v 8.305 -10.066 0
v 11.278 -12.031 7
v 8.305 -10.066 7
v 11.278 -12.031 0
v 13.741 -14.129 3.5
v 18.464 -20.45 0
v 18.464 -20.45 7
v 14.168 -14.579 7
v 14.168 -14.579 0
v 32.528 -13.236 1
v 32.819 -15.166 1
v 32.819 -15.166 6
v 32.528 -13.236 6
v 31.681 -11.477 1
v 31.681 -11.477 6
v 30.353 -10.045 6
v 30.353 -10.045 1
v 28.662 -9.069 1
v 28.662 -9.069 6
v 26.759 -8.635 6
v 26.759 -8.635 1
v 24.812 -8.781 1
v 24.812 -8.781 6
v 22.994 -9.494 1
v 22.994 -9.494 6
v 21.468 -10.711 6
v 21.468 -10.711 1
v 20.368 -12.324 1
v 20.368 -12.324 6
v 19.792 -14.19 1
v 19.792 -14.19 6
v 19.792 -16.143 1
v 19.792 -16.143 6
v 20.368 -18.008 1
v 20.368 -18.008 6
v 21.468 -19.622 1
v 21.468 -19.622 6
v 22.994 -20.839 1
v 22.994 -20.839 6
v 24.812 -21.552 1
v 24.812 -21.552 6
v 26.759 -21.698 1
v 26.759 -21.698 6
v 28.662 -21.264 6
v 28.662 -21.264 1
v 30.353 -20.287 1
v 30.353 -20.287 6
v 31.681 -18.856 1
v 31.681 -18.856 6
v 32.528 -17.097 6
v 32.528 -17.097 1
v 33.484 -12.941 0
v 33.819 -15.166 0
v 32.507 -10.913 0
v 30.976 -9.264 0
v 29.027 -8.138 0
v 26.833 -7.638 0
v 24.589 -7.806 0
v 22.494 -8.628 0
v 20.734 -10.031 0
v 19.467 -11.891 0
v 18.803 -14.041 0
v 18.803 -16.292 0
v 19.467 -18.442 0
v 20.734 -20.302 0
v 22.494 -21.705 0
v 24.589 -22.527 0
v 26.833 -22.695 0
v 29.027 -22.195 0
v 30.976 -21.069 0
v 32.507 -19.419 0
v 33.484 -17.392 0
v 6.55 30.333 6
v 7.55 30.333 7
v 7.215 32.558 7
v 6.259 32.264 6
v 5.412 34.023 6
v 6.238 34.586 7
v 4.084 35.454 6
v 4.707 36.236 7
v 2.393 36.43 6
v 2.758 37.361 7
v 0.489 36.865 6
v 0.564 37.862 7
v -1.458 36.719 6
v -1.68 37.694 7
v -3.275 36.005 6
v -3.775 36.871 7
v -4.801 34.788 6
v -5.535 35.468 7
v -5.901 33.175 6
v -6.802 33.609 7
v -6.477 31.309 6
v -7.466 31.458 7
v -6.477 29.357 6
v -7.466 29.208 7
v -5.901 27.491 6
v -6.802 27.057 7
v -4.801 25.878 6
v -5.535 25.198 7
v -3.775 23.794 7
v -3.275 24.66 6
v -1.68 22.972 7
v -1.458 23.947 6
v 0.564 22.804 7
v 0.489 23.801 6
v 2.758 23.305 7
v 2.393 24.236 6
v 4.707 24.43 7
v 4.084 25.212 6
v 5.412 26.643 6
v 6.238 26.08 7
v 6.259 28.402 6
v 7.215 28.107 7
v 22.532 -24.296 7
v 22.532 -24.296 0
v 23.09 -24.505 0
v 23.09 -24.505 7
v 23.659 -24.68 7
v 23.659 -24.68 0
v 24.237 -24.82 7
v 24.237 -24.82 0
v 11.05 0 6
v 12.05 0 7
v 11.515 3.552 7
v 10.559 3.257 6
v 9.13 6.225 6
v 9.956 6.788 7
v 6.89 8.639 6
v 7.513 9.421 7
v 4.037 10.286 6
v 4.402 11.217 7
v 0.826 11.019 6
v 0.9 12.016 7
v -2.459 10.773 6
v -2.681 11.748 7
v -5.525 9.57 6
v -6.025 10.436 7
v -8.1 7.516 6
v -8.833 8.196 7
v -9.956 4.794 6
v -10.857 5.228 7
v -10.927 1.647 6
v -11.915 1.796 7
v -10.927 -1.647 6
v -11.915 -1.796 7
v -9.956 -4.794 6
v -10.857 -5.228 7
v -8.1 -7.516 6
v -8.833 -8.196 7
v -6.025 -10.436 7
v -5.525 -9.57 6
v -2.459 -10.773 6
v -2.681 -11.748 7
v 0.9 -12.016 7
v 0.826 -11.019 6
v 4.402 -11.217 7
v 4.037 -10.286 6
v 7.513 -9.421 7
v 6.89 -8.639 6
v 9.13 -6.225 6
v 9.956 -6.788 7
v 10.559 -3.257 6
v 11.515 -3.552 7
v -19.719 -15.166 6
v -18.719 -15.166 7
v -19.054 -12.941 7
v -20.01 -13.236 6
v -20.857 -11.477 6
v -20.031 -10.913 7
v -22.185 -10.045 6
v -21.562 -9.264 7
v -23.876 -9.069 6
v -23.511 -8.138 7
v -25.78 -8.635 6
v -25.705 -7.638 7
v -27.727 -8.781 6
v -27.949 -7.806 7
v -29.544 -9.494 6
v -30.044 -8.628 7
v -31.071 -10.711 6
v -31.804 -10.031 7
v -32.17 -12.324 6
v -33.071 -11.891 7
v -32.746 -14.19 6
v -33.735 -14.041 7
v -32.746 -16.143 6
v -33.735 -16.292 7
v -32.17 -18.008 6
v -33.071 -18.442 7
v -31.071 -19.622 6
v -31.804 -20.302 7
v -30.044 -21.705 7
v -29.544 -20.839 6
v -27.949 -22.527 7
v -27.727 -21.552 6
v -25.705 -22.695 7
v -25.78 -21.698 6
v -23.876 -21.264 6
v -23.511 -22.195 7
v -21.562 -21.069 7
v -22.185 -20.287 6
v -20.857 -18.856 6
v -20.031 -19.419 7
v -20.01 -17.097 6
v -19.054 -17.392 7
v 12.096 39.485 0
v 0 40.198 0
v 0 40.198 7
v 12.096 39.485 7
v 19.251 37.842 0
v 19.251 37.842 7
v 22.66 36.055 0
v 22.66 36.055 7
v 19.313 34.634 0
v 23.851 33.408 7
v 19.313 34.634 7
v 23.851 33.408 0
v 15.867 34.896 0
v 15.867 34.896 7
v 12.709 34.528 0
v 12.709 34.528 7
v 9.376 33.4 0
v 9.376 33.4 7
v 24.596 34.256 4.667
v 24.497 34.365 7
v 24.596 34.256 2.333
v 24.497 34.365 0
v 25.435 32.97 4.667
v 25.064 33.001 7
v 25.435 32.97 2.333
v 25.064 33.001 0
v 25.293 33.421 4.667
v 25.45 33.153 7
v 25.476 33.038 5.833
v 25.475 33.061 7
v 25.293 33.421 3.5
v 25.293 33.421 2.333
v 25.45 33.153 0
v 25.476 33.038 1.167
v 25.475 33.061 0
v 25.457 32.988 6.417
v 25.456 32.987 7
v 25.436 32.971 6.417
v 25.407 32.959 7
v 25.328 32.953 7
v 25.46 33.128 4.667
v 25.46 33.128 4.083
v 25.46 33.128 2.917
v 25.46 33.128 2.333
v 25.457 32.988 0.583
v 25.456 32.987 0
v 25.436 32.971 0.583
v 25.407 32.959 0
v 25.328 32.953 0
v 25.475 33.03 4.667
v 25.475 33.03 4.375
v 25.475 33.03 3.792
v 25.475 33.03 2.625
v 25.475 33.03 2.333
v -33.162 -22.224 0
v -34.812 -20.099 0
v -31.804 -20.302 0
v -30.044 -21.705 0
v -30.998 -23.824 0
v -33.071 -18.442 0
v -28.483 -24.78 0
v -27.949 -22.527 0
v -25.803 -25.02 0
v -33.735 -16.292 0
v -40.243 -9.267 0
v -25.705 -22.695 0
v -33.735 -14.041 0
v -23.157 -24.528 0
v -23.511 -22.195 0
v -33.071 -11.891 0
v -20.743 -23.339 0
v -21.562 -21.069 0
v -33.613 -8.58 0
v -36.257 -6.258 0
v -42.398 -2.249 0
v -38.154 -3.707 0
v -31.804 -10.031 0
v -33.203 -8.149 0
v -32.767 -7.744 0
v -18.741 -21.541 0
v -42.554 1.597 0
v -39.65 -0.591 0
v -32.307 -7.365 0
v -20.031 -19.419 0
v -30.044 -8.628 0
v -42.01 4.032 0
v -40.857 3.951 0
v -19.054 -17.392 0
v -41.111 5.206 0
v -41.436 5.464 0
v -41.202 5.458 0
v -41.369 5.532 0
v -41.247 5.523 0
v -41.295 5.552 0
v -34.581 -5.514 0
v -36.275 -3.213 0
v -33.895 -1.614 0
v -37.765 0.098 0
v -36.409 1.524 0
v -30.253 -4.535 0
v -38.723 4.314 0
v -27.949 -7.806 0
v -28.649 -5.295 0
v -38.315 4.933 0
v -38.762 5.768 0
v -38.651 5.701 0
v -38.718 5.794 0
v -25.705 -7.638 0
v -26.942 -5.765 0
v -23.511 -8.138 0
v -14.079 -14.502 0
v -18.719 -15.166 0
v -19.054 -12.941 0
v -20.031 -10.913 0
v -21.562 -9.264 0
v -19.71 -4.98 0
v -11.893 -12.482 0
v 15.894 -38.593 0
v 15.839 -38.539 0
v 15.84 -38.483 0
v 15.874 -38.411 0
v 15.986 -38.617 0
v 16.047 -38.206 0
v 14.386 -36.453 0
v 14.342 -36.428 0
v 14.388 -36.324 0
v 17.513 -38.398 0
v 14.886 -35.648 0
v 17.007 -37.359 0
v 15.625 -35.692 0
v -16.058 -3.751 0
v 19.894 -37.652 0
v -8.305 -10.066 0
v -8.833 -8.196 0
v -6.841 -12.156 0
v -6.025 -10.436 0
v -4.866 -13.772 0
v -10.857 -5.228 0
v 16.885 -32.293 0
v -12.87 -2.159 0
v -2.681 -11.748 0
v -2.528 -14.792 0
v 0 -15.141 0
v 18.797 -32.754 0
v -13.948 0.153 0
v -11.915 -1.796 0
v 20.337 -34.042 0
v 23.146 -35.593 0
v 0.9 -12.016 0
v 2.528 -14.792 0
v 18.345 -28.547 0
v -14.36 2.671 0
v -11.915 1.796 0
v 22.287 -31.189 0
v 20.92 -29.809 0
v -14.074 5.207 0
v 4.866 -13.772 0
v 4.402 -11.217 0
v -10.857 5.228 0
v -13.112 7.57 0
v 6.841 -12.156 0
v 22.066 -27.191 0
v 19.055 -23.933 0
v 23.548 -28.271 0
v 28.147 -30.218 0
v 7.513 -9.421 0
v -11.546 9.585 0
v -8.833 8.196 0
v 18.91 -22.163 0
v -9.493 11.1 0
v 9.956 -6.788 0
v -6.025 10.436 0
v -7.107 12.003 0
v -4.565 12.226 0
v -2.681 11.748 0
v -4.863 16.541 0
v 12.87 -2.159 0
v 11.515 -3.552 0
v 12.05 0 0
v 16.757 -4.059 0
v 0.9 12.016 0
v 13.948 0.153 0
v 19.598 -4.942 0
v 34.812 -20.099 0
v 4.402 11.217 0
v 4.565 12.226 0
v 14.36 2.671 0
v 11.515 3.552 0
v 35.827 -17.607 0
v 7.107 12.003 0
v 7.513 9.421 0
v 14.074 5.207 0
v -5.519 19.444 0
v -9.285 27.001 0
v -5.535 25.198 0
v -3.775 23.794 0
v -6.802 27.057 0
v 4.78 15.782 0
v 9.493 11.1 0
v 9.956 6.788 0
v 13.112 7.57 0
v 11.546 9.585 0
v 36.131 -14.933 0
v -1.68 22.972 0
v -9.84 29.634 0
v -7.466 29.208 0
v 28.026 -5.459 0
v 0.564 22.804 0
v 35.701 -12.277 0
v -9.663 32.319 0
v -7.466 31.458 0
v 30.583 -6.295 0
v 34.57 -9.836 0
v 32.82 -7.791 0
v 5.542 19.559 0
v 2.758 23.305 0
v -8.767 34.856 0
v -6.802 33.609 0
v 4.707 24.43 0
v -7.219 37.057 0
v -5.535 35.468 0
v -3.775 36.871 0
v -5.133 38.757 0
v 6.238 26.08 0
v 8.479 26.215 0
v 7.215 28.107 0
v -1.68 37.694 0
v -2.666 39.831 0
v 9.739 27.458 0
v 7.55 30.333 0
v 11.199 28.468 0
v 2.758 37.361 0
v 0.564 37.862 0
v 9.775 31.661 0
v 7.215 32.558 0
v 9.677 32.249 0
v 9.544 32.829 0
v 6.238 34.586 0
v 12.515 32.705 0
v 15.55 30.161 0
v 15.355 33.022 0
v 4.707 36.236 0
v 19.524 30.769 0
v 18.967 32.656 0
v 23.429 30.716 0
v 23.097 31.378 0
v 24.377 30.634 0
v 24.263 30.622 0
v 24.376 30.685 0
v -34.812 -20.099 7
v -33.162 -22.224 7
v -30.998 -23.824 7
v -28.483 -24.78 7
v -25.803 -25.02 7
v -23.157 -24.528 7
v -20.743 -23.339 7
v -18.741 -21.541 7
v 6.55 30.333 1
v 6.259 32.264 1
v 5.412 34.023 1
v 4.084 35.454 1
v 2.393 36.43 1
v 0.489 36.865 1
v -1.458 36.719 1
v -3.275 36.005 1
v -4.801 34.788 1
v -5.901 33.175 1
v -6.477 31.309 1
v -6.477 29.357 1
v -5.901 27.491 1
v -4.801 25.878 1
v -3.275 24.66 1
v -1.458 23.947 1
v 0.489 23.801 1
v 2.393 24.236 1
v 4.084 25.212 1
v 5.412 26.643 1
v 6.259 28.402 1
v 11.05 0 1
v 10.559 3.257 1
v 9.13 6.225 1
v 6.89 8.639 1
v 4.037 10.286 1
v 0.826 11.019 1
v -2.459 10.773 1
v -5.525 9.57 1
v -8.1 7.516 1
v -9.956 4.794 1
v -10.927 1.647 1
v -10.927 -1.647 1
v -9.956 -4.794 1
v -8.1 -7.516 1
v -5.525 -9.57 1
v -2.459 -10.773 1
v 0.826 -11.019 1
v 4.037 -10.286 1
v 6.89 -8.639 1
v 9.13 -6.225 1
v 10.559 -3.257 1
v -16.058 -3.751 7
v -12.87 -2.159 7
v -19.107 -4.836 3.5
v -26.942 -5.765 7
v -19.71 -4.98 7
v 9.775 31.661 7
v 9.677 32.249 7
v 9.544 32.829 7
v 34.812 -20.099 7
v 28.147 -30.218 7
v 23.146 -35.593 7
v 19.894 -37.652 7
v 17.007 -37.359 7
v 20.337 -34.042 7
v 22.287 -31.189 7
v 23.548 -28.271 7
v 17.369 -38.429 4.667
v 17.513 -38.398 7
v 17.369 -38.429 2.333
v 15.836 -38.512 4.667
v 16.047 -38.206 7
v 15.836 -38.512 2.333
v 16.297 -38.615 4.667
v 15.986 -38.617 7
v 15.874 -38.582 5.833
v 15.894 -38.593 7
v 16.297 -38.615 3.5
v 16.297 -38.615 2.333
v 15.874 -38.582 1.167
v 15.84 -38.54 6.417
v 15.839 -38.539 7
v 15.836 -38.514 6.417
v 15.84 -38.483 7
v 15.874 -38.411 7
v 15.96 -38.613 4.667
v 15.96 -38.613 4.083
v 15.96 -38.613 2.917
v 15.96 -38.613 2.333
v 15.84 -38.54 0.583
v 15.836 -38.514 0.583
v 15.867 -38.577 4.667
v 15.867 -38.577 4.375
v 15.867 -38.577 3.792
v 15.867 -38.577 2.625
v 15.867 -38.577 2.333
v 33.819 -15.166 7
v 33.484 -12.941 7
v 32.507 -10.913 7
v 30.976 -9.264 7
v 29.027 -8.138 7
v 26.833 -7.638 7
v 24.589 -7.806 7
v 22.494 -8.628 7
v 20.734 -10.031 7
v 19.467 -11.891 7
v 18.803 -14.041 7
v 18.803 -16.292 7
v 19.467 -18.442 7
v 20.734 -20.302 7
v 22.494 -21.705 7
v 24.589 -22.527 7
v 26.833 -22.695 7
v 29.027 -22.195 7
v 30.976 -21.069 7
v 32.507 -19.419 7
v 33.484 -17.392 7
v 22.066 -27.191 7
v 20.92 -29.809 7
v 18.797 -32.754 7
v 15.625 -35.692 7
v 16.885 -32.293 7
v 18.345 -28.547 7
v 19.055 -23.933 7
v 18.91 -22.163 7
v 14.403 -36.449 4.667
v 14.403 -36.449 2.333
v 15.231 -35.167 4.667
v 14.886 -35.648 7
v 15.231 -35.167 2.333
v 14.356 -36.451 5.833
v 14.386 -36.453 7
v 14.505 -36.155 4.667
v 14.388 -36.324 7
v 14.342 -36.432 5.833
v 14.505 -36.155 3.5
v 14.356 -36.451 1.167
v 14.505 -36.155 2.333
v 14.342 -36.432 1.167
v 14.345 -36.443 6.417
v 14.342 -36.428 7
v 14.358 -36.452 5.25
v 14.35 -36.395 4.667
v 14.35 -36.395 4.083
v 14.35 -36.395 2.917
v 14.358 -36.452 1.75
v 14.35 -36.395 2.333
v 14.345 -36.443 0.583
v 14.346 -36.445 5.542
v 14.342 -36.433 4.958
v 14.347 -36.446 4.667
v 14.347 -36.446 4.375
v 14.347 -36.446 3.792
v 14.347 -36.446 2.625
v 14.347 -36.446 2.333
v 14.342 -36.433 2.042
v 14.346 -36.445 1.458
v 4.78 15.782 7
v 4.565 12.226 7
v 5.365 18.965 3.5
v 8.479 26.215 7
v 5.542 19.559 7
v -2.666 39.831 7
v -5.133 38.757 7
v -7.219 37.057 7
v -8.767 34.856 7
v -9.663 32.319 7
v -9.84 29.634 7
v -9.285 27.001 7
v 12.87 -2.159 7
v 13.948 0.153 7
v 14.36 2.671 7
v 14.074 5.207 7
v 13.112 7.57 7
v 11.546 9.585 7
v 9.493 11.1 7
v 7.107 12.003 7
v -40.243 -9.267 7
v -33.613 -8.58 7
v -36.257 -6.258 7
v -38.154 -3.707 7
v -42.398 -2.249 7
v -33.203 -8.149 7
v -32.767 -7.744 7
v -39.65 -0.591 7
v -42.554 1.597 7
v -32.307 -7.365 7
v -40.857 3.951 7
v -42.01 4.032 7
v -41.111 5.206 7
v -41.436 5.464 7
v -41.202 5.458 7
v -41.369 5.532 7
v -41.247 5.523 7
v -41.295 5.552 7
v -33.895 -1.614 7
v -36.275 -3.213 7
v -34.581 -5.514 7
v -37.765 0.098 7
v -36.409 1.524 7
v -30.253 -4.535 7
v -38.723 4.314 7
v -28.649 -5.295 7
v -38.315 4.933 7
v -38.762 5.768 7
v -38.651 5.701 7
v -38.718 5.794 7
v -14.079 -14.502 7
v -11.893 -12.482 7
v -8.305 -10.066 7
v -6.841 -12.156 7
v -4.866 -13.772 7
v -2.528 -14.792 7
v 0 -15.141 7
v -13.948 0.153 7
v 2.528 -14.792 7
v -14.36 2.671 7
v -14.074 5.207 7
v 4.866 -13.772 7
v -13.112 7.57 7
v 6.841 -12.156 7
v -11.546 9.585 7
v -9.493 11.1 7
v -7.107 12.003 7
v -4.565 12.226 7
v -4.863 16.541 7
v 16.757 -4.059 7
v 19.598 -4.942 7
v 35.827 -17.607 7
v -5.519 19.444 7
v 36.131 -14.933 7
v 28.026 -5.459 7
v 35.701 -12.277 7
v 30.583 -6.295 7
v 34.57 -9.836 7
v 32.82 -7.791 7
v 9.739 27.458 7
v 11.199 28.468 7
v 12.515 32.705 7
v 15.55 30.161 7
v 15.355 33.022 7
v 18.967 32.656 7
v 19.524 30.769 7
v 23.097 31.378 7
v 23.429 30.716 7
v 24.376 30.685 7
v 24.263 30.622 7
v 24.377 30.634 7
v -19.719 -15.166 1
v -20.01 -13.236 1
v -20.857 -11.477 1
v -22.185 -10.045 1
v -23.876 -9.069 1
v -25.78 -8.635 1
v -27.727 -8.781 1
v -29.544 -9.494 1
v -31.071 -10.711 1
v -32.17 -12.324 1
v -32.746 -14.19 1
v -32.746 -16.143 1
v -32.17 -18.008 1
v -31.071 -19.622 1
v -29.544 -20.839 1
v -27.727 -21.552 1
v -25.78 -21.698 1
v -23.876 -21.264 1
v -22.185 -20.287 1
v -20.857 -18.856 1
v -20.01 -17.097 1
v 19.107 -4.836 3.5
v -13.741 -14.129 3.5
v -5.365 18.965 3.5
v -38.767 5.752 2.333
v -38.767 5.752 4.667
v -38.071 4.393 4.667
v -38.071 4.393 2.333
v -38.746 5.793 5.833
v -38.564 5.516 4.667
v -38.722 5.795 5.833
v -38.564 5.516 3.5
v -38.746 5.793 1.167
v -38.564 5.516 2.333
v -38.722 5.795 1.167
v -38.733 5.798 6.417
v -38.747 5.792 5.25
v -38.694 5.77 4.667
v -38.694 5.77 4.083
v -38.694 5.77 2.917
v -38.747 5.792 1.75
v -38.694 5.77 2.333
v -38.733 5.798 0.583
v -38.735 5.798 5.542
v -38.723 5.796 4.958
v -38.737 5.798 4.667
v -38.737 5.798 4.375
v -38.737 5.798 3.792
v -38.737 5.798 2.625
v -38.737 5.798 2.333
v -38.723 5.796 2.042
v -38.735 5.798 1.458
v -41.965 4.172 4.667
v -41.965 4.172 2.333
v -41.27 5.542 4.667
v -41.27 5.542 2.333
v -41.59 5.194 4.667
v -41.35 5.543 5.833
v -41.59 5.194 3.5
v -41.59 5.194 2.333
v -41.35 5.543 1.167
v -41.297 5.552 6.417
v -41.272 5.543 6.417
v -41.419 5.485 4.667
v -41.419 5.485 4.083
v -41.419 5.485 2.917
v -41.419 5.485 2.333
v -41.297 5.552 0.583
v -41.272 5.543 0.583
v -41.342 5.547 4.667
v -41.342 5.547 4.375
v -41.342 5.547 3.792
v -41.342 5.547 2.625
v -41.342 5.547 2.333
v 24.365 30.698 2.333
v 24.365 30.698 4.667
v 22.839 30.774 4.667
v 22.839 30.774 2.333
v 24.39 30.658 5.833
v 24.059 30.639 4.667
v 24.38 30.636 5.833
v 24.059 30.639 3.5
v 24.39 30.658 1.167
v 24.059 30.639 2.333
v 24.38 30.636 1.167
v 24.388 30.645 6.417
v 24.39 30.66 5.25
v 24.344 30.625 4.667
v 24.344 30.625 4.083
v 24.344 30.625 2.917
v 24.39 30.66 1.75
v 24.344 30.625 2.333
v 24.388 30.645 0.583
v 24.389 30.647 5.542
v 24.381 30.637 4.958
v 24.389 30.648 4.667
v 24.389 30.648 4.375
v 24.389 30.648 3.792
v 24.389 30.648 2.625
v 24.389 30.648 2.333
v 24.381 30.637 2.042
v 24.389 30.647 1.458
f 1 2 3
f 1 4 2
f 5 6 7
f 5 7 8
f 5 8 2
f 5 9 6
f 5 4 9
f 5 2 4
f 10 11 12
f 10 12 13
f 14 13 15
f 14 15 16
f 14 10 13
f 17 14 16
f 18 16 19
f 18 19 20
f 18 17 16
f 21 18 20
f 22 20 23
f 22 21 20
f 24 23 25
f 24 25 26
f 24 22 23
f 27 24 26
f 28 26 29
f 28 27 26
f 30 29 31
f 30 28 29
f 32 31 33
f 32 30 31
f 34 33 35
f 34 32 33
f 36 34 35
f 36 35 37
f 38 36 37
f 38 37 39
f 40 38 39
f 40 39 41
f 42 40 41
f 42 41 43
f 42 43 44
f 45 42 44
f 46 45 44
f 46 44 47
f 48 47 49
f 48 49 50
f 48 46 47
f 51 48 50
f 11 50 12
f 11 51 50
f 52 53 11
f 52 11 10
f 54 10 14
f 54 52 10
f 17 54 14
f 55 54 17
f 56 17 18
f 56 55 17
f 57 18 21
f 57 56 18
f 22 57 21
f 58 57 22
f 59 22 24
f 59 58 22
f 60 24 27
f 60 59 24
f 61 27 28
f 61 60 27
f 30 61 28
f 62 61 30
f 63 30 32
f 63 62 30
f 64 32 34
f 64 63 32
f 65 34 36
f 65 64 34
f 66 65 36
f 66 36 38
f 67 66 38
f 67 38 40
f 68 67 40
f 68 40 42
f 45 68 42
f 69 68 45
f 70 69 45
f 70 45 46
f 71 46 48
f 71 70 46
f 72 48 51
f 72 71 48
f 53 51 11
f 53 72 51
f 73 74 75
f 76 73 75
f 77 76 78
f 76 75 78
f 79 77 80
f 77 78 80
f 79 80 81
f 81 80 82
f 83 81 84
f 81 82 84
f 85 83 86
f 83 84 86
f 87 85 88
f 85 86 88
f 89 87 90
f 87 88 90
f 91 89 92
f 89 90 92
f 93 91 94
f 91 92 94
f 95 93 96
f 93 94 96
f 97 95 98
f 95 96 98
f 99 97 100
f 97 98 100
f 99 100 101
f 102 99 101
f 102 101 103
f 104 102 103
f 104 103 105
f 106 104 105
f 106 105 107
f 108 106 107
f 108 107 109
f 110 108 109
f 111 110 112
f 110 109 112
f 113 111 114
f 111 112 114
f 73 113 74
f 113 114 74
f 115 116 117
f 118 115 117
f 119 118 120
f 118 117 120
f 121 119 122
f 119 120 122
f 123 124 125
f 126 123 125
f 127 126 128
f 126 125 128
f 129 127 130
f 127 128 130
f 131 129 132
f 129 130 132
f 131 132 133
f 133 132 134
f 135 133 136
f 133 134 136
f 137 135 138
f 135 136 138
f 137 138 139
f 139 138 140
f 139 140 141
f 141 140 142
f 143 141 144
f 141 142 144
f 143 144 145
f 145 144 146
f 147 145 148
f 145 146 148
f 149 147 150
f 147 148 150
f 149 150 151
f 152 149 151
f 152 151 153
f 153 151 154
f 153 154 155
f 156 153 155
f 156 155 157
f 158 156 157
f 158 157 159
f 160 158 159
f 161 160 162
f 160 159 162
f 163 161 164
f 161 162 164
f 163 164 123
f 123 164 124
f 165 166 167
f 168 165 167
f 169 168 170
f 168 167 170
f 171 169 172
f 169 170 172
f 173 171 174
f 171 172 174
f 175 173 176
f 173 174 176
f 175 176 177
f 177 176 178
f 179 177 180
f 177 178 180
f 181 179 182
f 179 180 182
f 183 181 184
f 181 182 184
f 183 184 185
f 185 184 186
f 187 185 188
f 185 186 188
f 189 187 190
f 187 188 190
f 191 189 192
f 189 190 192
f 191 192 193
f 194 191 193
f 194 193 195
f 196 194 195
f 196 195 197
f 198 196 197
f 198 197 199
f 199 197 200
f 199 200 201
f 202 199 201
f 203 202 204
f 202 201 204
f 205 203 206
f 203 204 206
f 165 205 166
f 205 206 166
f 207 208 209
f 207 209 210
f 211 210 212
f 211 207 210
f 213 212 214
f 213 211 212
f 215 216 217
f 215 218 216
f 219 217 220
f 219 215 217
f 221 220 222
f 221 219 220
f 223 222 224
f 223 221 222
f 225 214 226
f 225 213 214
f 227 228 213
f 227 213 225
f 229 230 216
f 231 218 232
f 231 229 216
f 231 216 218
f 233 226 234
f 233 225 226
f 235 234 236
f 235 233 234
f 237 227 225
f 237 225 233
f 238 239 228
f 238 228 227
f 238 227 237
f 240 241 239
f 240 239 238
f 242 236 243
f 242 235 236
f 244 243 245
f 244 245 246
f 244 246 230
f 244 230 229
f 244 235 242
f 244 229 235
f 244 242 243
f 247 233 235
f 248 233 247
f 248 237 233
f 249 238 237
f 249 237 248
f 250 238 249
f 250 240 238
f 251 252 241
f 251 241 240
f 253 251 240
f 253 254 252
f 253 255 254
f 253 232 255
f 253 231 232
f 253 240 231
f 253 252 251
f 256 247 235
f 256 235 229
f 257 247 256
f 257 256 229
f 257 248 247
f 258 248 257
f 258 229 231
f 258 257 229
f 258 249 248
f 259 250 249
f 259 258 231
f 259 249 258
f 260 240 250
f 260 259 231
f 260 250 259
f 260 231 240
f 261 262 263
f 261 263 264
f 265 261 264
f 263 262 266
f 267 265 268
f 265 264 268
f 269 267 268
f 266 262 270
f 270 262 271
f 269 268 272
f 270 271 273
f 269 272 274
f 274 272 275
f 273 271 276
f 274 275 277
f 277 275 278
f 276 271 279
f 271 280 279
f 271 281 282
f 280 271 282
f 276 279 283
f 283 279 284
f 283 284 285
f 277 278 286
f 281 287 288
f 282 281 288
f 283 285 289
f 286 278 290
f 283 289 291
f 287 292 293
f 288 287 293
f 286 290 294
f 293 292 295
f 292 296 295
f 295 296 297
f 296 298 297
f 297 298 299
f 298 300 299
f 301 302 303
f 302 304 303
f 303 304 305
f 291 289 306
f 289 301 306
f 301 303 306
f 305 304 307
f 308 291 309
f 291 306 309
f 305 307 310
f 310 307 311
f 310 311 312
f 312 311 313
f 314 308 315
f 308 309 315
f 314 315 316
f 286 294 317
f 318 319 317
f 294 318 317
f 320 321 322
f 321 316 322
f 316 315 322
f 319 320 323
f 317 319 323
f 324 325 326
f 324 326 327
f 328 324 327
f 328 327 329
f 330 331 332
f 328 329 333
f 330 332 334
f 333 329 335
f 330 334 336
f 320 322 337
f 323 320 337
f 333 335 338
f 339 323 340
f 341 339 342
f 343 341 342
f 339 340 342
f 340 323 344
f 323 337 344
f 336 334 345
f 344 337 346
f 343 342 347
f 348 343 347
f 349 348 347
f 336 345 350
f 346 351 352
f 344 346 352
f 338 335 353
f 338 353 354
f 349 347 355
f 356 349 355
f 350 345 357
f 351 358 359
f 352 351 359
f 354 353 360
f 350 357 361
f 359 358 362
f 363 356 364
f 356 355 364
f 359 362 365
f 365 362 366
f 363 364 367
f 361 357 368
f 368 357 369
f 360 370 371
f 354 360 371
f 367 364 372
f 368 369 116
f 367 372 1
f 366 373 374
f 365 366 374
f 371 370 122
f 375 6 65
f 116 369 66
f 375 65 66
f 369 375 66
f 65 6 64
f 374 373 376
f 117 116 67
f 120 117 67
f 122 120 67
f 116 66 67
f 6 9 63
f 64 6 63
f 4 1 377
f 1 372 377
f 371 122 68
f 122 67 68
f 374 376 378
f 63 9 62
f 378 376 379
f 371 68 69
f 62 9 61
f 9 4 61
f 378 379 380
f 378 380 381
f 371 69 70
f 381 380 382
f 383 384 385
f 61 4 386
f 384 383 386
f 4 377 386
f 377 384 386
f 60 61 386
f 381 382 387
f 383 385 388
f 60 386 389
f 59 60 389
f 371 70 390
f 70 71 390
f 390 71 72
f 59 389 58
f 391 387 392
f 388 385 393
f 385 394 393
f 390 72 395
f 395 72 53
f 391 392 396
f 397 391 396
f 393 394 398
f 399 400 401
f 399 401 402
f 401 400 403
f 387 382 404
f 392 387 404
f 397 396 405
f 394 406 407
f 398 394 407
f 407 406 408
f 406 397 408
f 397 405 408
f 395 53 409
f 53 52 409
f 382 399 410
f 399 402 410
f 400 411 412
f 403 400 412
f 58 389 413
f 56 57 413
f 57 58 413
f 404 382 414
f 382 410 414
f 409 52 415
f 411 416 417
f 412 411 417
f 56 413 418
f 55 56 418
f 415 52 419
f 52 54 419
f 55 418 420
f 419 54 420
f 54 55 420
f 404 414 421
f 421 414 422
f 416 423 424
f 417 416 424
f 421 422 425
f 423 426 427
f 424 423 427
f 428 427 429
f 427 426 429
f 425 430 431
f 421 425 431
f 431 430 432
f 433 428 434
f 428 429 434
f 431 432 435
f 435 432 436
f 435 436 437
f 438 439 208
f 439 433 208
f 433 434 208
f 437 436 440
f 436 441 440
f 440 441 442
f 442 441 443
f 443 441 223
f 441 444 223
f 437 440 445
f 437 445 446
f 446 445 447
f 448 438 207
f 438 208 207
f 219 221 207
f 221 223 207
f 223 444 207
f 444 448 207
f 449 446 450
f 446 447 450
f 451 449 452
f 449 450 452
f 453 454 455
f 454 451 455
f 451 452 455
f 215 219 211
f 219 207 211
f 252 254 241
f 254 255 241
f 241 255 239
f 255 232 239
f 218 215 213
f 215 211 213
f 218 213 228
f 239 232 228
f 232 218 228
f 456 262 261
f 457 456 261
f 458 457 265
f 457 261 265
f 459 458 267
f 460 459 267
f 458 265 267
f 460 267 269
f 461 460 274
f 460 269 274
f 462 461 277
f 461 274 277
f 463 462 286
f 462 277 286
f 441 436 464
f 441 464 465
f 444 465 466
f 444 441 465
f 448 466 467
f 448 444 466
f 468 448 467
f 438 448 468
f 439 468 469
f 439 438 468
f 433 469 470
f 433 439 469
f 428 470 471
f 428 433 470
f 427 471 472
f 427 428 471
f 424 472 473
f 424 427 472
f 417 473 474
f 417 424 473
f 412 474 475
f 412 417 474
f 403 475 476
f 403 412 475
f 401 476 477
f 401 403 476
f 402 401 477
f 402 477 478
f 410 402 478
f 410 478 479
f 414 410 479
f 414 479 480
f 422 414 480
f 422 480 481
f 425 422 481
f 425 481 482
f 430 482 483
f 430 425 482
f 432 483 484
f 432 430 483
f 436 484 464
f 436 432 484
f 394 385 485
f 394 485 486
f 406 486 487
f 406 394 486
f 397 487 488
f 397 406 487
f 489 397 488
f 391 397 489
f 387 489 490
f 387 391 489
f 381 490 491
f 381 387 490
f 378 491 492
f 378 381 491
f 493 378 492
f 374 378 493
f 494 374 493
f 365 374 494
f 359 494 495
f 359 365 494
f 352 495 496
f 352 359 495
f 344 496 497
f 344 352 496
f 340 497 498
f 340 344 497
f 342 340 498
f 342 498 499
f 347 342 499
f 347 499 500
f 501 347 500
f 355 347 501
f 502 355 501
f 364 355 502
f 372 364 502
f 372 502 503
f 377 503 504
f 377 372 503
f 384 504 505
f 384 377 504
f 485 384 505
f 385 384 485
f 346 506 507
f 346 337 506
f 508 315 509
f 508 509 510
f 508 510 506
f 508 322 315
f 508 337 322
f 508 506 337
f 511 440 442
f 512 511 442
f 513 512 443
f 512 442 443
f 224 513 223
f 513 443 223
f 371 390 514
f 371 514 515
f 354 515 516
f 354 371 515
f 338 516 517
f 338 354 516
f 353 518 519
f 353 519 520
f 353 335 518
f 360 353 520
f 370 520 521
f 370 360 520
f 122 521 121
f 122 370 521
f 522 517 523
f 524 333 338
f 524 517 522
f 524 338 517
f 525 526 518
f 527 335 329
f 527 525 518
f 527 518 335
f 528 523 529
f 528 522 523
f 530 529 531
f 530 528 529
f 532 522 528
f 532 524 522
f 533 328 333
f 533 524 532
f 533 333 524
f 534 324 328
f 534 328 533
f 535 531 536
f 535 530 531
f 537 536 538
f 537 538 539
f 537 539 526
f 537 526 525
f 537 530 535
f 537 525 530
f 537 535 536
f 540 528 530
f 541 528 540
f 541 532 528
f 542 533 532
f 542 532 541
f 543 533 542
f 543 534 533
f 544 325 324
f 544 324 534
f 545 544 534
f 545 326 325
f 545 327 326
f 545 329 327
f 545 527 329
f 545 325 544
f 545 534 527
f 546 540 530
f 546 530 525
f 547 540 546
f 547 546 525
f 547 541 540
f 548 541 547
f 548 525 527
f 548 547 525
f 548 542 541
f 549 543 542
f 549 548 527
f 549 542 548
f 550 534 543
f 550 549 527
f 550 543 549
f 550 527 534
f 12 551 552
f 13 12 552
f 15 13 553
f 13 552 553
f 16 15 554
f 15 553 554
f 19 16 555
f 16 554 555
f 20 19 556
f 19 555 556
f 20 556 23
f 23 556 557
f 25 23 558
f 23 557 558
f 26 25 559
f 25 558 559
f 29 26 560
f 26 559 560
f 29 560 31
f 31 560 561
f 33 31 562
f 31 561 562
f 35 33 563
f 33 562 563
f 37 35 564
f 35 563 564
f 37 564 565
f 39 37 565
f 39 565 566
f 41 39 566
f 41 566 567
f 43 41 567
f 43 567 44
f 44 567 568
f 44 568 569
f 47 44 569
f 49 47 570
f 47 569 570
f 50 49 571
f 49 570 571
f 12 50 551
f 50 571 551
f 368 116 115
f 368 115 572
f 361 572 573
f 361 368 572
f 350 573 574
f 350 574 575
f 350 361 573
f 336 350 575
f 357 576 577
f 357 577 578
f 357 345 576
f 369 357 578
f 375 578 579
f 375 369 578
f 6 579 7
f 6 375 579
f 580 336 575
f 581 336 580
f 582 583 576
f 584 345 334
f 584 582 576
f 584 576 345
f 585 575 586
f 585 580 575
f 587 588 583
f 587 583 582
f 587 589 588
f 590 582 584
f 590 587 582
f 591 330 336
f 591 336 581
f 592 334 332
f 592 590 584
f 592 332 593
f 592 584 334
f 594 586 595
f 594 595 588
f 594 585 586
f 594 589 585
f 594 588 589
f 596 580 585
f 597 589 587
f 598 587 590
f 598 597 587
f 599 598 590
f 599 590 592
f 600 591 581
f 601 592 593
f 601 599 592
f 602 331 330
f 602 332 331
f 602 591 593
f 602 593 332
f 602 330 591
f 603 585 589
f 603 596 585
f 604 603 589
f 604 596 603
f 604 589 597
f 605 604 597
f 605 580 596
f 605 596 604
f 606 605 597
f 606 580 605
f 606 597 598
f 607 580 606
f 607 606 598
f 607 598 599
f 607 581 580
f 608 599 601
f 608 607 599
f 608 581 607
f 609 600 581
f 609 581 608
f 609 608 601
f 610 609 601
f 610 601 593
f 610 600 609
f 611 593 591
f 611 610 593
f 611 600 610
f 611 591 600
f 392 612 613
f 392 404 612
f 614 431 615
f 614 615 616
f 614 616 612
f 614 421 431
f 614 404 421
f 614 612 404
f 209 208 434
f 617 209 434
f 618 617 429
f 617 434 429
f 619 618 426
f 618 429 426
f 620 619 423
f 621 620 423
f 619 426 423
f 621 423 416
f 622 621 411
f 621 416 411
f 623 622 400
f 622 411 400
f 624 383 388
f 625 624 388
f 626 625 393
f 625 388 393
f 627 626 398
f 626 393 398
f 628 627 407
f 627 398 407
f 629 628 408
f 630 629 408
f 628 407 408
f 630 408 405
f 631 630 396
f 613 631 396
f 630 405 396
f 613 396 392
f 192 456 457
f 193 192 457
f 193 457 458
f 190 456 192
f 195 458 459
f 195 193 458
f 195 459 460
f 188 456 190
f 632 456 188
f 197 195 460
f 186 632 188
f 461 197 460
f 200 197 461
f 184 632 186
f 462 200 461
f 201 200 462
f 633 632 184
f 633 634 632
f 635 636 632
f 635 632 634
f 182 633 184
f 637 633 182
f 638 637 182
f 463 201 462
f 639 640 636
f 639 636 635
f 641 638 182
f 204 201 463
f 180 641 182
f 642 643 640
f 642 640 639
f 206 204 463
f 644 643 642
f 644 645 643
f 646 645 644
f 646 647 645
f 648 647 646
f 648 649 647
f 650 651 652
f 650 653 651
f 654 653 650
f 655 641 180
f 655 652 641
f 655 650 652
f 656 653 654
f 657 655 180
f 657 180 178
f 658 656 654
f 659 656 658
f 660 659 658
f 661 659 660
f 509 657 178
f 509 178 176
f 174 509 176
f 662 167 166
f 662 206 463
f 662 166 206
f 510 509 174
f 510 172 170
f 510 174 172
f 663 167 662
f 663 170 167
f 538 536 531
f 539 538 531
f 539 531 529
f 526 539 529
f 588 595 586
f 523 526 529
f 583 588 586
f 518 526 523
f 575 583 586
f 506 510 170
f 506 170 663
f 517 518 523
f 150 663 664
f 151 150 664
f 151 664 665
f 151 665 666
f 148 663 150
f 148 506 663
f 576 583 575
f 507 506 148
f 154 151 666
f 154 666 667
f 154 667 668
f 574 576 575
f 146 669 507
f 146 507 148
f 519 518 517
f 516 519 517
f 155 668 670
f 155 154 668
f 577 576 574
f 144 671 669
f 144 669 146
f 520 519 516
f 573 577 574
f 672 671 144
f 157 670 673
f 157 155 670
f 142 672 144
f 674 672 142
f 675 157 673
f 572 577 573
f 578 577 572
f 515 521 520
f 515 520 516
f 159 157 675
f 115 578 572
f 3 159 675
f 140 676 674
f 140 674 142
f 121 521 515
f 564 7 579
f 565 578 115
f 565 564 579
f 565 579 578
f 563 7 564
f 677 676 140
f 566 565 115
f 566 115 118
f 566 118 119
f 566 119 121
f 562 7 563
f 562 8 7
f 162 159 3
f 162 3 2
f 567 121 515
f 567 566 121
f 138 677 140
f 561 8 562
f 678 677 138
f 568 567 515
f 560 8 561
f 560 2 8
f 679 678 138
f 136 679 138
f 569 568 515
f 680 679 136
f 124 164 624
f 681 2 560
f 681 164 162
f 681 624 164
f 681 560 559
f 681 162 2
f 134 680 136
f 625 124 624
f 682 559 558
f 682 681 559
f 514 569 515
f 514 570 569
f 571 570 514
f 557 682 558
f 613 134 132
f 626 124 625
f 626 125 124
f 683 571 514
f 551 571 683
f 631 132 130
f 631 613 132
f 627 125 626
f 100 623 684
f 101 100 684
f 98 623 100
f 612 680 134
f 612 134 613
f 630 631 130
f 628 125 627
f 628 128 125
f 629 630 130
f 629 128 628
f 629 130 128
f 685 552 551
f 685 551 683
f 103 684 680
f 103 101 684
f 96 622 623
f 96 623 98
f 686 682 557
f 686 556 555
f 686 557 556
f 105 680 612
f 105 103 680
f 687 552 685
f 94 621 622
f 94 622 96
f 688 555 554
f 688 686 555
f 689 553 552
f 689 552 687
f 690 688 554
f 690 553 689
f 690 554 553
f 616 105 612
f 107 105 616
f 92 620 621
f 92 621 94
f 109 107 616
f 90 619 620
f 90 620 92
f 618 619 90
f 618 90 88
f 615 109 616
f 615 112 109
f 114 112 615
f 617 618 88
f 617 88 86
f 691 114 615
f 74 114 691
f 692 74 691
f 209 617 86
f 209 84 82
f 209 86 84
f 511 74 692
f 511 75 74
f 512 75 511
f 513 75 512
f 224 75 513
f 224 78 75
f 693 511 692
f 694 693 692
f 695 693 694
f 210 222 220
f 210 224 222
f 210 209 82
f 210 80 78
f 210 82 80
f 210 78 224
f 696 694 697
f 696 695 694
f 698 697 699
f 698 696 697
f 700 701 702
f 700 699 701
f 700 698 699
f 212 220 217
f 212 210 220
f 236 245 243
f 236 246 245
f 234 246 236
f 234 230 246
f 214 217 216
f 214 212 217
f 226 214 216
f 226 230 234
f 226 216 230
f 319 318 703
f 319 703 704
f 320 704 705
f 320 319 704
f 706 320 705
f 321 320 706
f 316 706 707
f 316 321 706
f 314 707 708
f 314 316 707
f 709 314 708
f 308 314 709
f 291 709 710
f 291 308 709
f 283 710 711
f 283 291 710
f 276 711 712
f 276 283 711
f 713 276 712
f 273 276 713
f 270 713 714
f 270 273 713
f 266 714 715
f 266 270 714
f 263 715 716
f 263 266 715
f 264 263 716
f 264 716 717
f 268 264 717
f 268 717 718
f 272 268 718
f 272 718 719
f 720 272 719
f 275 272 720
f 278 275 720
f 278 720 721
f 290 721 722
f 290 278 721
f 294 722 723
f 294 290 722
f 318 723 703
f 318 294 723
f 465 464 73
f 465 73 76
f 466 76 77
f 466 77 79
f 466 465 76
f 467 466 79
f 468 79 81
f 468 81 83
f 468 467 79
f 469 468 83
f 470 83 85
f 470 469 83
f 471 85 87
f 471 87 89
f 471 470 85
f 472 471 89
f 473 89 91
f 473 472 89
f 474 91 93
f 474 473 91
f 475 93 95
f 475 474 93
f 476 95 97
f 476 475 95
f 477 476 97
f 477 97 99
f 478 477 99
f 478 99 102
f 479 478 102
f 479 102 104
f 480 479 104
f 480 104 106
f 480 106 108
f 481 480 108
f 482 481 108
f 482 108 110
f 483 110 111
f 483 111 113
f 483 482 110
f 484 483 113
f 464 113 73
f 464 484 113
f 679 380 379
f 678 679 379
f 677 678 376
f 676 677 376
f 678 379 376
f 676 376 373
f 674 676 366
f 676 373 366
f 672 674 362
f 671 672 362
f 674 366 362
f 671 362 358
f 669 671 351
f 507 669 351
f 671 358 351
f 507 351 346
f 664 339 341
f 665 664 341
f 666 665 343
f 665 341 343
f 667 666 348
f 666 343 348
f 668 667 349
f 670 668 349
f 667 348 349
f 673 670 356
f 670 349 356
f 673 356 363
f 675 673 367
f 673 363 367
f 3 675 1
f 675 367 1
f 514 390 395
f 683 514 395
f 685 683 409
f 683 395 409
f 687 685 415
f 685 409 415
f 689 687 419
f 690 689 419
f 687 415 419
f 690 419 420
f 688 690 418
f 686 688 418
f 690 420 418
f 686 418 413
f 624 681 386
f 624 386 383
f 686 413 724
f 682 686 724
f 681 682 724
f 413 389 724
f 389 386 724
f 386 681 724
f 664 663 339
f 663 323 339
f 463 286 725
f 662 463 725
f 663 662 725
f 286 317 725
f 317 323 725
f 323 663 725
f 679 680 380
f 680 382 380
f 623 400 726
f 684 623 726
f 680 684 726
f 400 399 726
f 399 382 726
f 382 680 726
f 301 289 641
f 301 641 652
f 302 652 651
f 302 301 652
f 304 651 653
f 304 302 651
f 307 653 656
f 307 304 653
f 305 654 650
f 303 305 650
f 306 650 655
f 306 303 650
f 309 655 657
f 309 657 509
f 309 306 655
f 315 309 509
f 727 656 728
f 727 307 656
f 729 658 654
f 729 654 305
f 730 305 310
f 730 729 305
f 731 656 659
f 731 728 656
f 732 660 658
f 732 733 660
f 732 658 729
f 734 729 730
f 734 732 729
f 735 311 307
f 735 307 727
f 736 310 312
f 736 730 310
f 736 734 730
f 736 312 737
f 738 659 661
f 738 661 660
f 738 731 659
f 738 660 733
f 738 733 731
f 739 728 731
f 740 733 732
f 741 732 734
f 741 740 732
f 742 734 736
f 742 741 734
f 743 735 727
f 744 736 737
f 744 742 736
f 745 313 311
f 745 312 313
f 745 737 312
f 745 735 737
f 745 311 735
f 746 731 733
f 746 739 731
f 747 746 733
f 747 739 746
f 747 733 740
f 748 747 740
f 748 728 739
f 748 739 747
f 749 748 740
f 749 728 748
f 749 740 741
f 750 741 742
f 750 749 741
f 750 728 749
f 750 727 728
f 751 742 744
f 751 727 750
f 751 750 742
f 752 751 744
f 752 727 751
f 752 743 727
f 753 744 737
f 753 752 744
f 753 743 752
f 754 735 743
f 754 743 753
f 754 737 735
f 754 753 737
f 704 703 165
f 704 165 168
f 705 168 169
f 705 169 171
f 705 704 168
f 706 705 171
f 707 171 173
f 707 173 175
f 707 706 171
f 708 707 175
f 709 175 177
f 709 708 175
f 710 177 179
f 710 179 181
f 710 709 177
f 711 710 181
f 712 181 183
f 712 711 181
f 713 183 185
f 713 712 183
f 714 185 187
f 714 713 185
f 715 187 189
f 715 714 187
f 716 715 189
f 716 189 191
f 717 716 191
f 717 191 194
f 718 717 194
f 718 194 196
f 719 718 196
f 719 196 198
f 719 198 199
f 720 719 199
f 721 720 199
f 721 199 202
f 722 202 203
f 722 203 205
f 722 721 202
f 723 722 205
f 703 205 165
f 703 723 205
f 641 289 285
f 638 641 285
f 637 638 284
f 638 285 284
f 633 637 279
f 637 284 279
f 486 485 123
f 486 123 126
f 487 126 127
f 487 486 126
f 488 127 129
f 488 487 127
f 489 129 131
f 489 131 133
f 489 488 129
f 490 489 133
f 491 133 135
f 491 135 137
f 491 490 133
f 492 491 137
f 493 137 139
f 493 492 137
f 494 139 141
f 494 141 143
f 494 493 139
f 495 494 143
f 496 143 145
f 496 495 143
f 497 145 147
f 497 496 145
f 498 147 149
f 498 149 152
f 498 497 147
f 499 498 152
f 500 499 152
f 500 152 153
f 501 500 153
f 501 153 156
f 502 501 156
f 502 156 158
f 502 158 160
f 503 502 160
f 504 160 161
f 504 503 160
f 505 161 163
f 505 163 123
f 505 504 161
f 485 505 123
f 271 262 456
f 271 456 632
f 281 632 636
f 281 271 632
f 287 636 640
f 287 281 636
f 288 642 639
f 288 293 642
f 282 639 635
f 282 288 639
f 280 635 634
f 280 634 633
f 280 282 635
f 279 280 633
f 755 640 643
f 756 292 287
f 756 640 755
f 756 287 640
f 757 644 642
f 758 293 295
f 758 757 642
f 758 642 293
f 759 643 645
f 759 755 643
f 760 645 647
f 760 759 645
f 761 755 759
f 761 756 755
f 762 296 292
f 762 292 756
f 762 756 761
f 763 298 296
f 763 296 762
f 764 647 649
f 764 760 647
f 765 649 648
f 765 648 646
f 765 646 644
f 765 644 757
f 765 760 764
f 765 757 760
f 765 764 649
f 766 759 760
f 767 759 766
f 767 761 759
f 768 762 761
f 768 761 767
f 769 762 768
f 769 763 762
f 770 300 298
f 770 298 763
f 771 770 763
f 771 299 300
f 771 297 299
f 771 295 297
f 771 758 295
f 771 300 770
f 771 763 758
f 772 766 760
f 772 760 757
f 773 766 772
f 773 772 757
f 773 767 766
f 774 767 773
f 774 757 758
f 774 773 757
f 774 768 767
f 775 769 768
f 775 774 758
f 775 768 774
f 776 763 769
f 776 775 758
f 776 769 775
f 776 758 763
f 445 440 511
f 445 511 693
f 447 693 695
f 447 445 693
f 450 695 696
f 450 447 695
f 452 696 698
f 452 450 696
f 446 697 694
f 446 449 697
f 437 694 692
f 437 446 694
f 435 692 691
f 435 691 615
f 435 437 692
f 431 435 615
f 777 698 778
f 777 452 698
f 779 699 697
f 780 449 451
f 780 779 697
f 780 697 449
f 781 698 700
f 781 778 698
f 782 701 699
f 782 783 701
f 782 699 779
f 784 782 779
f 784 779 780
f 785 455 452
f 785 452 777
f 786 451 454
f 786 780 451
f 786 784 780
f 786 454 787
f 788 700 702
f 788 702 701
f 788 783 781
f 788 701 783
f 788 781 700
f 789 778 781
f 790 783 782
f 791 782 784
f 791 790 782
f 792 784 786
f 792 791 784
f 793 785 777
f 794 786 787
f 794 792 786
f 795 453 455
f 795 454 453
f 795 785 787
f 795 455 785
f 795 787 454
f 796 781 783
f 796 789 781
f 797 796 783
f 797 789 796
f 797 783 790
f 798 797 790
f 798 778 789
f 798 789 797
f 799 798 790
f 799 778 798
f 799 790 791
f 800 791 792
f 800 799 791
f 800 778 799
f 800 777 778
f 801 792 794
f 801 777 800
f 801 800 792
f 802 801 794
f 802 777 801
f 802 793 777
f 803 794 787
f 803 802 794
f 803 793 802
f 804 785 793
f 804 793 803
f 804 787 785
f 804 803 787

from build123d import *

# Parameters (mm, degrees)
F0_R     = 6.55
F0_R_2   = 11.05
F1_DEPTH = 7
F2_SIZE  = 1


# Not quite as in the source:
# - ends of sketch curves that miss each other by under 0.0002 mm in the source are joined


with BuildPart() as f1:
    # F0 (on Top) → F1 (new body)
    with BuildSketch(Plane.XY):
        with BuildLine():
            ThreePointArc((0, 40.1977714043), (-8.0681283552, 36.0092836242), (-9.2850536357, 27.0005535305))
            add(Edge.make_bspline(
                [(-9.2850536357, 27.0005535305), (-7.6485537074, 23.76762968), (-4.7701185707, 19.4412735204), (-4.6697456794, 14.4884170356), (-4.5648748072, 12.2255101831)],
                knots=[0, 0, 0, 0, 0.5344080552, 1, 1, 1, 1], degree=3))
            ThreePointArc((-4.5648748072, 12.2255101831), (-13.112130235, 7.5702762234), (-12.8700869391, -2.1594819242))
            add(Edge.make_bspline(
                [(-26.9423555096, -5.7646466266), (-24.1168902387, -5.6160652927), (-18.509620442, -5.2218898403), (-14.7902779868, -3.1525456922), (-12.8700869391, -2.1594819242)],
                knots=[0.1344901828, 0.1344901828, 0.1344901828, 0.1344901828, 0.5556800273, 1, 1, 1, 1], degree=3))
            add(Edge.make_bspline(
                [(-32.3070856345, -7.3652547262), (-38.1561546686, -3.8908306821), (-39.2425077068, 7.9341737596), (-37.973119311, 3.3638390897), (-32.4811016658, -4.8031550223), (-26.9423555096, -5.7646466266)],
                knots=[0, 0, 0, 0, 0.4276612867, 0.5658731858, 1, 1, 1, 1], degree=3))
            ThreePointArc((-32.3070856345, -7.3652547262), (-32.9876607035, -7.9431032983), (-33.6132053721, -8.5801160647))
            add(Edge.make_bspline(
                [(-34.8122912116, -20.0988857021), (-44.0385765115, -3.9019687515), (-42.749663868, 2.1665983757), (-40.6223387742, 7.8779194346), (-40.8804383129, -3.4972060171), (-33.6132053721, -8.5801160647)],
                knots=[0, 0, 0, 0, 0.4894381035, 0.610016492, 1, 1, 1, 1], degree=3))
            ThreePointArc((-34.8122912116, -20.0988857021), (-27.150890213, -24.9918459287), (-18.7406384558, -21.5413690893))
            add(Edge.make_bspline(
                [(-18.7406384558, -21.5413690893), (-16.7590942369, -18.5076566528), (-14.4515774653, -13.8516806215), (-10.2124643737, -11.2883269054), (-8.3051649892, -10.0660526397)],
                knots=[0, 0, 0, 0, 0.5344080552, 1, 1, 1, 1], degree=3))
            ThreePointArc((-8.3051649892, -10.0660526397), (1.35944e-05, -15.1405759929), (8.3052096749, -10.0660812761))
            add(Edge.make_bspline(
                [(18.4635081773, -20.4504409958), (16.9221003321, -18.0778069606), (13.7770994784, -13.4188565971), (10.1253236494, -11.2324836195), (8.3052096749, -10.0660812761)],
                knots=[0.1344901828, 0.1344901828, 0.1344901828, 0.1344901828, 0.5556800273, 1, 1, 1, 1], degree=3))
            add(Edge.make_bspline(
                [(22.5320405154, -24.2961295186), (22.4476355468, -31.0987839127), (12.7500578195, -37.9520954621), (16.0733895496, -34.5676055291), (20.4002051005, -25.7278816743), (18.4635081773, -20.4504409958)],
                knots=[0, 0, 0, 0, 0.4276612867, 0.5658731858, 1, 1, 1, 1], degree=3))
            ThreePointArc((22.5320405154, -24.2961295186), (23.3727595929, -24.5966005315), (24.2372011654, -24.8198317225))
            add(Edge.make_bspline(
                [(34.8122912116, -20.0988857021), (25.3984923193, -36.1875416297), (19.4985027008, -38.1055941008), (13.4886910278, -39.1189370569), (23.4688884096, -33.6548950882), (24.2372011654, -24.8198317225)],
                knots=[0, 0, 0, 0, 0.4894381035, 0.610016492, 1, 1, 1, 1], degree=3))
            ThreePointArc((34.8122912116, -20.0988857021), (35.2190185683, -11.0174376955), (28.0256920915, -5.4591844412))
            add(Edge.make_bspline(
                [(28.0256920915, -5.4591844412), (24.4076479443, -5.2599730272), (19.221696036, -5.5895928989), (14.8822100532, -3.2000901302), (12.8700397964, -2.1594575434)],
                knots=[0, 0, 0, 0, 0.5344080552, 1, 1, 1, 1], degree=3))
            ThreePointArc((12.8700397964, -2.1594575434), (13.1121166406, 7.5702997695), (4.5648772642, 12.2255632002))
            add(Edge.make_bspline(
                [(8.4788473323, 26.2150876224), (7.1947899065, 23.6938722533), (4.7325209636, 18.6407464373), (4.6649543374, 14.3850293117), (4.5648772642, 12.2255632002)],
                knots=[0.1344901828, 0.1344901828, 0.1344901828, 0.1344901828, 0.5556800273, 1, 1, 1, 1], degree=3))
            add(Edge.make_bspline(
                [(9.775045119, 31.6613842448), (15.7085191218, 34.9896145947), (26.4924498873, 30.0179217024), (21.8997297614, 31.2037664394), (12.0808965652, 30.5310366966), (8.4788473323, 26.2150876224)],
                knots=[0, 0, 0, 0, 0.4276612867, 0.5658731858, 1, 1, 1, 1], degree=3))
            ThreePointArc((9.775045119, 31.6613842448), (9.6149011106, 32.5397038298), (9.3760042066, 33.3999477872))
            add(Edge.make_bspline(
                [(0, 40.1977714043), (18.6400841922, 40.0895103812), (23.2511611671, 35.9389957251), (27.1336477464, 31.2410176223), (17.4115499033, 37.1521011054), (9.3760042066, 33.3999477872)],
                knots=[0, 0, 0, 0, 0.4894381035, 0.610016492, 1, 1, 1, 1], degree=3))
        make_face()
        with Locations((-26.2690269878, -15.1664298028)):
            Circle(F0_R, mode=Mode.SUBTRACT)
        Circle(F0_R_2, mode=Mode.SUBTRACT)
        with Locations((26.2690269878, -15.1664298028)):
            Circle(F0_R, mode=Mode.SUBTRACT)
        with Locations((0, 30.3328596056)):
            Circle(F0_R, mode=Mode.SUBTRACT)
    extrude(amount=F1_DEPTH)

    # F2
    f2_edges = [f1.edges().sort_by_distance(p)[0] for p in [
        (-11.05, 0, 0),
        (19.719027, -15.16643, 0),
        (-6.55, 30.33286, 0),
        (-32.819027, -15.16643, 0),
        (-6.55, 30.33286, 7),
        (-32.819027, -15.16643, 7),
        (11.05, 0, 3.5),
        (-11.05, 0, 7),
        (19.719027, -15.16643, 7),
    ]]
    chamfer(f2_edges, length=F2_SIZE)


solid = f1.part
